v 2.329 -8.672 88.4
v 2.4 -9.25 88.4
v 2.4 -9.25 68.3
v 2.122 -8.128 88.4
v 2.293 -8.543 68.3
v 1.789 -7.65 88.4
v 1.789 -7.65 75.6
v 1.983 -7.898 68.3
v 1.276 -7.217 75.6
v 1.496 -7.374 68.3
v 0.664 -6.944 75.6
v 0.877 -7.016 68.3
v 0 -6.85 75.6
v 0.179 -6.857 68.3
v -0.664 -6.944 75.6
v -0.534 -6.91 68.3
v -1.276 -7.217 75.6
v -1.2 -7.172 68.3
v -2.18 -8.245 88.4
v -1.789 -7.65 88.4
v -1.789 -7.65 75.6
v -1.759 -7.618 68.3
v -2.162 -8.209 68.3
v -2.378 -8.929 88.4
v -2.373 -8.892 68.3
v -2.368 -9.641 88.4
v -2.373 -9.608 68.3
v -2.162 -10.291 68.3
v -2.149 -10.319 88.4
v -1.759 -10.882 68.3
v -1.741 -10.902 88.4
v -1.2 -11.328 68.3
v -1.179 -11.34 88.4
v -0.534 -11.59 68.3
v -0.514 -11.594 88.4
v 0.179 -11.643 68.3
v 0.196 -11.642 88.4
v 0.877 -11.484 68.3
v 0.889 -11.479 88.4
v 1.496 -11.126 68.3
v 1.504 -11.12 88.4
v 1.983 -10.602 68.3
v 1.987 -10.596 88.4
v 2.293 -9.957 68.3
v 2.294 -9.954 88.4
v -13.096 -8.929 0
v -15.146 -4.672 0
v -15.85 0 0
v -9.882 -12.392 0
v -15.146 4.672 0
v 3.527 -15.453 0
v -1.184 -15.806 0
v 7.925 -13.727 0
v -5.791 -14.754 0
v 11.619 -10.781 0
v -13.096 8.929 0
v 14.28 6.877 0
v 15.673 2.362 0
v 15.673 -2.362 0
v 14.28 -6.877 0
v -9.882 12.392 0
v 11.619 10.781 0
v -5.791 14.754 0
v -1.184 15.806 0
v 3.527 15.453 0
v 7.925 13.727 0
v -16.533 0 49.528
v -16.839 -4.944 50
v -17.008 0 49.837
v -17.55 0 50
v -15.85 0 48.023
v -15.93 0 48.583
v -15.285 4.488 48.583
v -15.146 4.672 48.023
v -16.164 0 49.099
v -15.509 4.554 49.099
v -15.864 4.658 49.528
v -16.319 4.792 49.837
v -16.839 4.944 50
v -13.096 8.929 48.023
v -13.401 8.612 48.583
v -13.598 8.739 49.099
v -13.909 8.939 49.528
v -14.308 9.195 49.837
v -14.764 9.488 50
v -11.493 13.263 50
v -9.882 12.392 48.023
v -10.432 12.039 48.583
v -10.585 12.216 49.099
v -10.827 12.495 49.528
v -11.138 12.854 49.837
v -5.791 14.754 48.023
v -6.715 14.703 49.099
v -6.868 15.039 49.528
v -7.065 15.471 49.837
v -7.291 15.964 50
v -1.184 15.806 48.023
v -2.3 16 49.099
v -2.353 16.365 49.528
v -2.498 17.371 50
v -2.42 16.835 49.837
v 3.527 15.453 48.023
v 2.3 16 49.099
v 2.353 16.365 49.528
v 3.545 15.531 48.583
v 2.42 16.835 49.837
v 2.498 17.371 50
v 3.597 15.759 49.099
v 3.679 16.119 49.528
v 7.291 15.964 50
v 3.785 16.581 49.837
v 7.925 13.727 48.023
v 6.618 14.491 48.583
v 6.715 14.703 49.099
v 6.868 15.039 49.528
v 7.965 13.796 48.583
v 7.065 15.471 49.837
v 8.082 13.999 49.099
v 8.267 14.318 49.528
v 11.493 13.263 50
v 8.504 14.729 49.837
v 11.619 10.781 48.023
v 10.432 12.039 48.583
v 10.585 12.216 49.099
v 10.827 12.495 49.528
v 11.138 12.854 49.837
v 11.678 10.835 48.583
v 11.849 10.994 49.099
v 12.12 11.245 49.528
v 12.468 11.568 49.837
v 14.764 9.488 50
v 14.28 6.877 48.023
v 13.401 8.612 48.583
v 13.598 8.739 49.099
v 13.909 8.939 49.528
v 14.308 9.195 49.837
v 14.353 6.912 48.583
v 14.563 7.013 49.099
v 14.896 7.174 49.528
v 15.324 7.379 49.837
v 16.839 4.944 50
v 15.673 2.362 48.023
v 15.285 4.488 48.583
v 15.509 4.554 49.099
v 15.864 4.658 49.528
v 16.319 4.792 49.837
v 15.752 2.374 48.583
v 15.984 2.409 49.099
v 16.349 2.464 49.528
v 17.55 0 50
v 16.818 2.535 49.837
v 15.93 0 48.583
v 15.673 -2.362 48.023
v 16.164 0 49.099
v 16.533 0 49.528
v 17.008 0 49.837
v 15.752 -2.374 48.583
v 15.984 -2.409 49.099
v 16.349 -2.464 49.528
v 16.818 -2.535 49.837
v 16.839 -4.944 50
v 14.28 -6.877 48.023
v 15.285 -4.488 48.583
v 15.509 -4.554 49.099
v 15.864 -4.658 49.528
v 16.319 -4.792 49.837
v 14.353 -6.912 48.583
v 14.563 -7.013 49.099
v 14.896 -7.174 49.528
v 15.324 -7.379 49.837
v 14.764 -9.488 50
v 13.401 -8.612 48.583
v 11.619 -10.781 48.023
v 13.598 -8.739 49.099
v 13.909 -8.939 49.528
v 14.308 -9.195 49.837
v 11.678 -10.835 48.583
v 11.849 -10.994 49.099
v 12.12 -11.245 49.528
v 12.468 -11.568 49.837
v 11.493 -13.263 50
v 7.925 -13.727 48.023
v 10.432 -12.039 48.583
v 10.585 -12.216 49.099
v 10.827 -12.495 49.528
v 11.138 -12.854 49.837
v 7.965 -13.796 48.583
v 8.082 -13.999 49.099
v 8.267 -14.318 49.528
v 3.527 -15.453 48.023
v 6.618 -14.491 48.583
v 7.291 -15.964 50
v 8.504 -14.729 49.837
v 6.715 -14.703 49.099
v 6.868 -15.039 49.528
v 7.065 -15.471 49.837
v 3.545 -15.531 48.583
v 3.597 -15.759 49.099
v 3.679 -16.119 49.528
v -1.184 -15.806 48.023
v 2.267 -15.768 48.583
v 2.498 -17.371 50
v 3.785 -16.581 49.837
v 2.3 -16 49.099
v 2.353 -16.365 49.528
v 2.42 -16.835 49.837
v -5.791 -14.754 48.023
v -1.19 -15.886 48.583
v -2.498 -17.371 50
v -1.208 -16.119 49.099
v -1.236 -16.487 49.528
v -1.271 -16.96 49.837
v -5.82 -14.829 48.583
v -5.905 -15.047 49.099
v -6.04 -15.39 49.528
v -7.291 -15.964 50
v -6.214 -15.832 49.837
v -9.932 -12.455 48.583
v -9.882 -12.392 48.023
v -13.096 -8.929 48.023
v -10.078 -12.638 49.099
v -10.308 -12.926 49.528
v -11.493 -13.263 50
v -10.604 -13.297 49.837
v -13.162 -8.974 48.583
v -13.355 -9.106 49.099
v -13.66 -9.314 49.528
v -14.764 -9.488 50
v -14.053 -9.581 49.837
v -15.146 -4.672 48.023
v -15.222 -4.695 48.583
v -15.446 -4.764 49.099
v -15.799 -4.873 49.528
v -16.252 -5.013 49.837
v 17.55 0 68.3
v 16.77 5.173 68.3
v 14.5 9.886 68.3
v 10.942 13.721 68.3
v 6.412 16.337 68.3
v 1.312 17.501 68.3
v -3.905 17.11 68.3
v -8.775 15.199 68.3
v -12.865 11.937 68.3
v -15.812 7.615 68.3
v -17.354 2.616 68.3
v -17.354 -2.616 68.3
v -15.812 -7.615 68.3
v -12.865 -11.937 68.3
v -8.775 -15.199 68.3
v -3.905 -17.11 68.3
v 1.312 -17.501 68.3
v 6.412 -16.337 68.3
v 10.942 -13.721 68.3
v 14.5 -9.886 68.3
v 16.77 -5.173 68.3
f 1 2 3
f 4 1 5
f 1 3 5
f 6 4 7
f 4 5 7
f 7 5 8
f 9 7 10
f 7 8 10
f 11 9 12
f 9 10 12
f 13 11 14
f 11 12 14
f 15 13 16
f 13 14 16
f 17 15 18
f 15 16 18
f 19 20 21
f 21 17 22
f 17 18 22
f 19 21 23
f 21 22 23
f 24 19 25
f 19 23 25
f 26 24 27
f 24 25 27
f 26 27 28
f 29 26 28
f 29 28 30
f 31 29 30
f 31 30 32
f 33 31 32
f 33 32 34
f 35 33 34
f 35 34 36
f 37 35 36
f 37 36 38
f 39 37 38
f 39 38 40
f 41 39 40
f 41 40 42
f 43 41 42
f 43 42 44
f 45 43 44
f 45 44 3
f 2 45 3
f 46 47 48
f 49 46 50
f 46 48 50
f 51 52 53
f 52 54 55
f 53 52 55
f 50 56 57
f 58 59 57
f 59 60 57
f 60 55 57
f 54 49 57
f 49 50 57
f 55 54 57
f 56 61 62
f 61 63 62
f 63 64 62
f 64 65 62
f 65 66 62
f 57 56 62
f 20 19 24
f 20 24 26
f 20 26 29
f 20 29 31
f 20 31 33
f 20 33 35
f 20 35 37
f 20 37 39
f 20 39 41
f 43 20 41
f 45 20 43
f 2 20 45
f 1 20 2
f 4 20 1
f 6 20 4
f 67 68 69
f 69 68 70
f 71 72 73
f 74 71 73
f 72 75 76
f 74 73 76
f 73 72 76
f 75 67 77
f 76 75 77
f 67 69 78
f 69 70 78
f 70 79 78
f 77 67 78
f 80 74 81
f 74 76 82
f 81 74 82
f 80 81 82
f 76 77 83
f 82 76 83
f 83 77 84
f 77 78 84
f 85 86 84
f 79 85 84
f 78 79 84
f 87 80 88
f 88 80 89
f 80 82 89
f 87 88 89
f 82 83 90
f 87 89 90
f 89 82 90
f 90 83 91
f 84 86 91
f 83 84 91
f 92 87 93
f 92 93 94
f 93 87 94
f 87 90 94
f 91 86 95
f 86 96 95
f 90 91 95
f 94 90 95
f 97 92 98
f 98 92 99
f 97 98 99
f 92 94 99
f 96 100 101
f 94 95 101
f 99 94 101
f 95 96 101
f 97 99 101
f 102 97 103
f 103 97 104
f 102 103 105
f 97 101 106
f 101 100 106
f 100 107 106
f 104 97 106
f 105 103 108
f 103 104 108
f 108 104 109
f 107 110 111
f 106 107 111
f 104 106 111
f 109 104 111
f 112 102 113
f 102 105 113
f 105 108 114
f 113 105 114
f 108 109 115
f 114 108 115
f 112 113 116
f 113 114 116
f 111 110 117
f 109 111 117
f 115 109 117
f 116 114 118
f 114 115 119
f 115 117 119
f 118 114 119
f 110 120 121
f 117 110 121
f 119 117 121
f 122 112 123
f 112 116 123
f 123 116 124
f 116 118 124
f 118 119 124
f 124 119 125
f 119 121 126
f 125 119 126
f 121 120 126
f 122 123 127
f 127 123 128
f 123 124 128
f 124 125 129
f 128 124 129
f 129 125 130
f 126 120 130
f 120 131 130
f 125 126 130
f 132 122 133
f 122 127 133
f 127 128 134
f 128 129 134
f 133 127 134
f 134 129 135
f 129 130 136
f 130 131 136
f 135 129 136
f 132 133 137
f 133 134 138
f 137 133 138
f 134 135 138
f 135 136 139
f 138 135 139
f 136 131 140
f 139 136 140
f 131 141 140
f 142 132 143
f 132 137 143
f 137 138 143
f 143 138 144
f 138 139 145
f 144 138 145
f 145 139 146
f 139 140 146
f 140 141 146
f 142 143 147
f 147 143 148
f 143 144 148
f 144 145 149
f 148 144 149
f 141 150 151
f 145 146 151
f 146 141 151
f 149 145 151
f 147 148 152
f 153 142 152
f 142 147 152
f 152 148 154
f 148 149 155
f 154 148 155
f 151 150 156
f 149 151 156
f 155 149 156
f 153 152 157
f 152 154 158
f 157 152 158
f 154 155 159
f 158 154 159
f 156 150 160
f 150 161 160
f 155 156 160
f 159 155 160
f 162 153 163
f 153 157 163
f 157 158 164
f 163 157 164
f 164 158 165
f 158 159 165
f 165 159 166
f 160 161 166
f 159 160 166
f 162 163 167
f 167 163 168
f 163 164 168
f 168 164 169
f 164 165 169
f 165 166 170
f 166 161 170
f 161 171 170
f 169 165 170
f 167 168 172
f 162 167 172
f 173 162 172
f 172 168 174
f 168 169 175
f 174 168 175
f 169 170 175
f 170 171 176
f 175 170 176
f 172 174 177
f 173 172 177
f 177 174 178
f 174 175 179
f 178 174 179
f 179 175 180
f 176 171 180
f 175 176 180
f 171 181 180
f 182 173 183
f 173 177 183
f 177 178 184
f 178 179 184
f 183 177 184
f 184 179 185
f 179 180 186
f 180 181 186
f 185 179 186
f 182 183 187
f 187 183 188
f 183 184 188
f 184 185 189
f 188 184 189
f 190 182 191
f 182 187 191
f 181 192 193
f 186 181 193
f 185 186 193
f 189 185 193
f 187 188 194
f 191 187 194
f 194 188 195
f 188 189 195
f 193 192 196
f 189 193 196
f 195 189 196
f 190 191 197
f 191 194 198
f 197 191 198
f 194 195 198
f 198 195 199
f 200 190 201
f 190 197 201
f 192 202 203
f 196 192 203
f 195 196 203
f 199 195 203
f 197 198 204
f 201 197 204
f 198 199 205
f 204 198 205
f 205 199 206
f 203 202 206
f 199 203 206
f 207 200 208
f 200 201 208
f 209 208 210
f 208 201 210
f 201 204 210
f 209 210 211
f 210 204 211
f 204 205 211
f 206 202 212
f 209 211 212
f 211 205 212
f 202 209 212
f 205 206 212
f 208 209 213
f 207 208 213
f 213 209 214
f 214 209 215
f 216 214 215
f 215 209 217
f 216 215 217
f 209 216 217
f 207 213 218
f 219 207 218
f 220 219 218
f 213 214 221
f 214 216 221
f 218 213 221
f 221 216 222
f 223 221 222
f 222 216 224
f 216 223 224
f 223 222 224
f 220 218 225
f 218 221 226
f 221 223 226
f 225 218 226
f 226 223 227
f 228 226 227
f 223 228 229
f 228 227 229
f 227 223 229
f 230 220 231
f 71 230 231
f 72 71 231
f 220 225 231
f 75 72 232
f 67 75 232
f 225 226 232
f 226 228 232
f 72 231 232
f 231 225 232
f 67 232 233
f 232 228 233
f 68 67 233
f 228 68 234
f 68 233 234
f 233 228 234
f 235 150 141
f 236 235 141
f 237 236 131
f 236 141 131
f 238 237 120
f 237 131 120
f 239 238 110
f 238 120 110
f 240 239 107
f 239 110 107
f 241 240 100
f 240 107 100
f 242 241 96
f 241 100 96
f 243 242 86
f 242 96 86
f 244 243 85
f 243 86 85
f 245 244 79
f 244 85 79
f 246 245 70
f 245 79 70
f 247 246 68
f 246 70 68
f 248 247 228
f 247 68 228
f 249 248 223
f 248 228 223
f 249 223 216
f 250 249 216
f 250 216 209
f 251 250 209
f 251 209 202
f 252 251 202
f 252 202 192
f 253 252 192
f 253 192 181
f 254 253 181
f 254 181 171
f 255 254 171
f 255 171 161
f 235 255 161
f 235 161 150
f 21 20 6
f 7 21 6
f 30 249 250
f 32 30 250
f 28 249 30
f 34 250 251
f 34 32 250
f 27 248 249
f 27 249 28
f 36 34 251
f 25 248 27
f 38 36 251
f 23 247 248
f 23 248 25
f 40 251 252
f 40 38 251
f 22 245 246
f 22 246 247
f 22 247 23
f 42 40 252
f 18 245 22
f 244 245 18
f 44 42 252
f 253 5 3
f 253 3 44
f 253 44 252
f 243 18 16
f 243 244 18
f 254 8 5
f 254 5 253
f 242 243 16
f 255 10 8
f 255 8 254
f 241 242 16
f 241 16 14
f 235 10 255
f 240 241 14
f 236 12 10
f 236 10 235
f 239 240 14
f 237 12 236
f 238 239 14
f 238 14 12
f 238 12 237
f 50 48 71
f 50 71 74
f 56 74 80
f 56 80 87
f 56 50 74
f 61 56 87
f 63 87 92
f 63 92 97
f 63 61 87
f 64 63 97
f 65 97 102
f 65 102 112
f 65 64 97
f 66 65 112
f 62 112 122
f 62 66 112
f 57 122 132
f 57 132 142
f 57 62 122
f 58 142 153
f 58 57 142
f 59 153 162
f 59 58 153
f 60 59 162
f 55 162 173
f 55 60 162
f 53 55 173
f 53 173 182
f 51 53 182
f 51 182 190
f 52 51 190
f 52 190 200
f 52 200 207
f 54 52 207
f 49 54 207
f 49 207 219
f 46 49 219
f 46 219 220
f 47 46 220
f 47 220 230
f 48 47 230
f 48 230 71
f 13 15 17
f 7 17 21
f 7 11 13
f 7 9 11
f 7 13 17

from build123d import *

# Parameters (mm, degrees)
SKETCH2_R           = 17.55
BOSS_EXTRUDE1_DEPTH = 68.3
SKETCH4_R           = 17.55
SKETCH4_R_2         = 15.85
CUT_EXTRUDE1_DEPTH  = 50
SKETCH5_R           = 2.4
BOSS_EXTRUDE3_DEPTH = 20.1
SKETCH6_W           = 4.602135996
SKETCH6_H           = 1.29181111
CUT_EXTRUDE2_DEPTH  = 12.8
FILLET1_R           = 2


with BuildPart() as part:
    # Sketch2 → Boss-Extrude1 (new body)
    with BuildSketch(Plane.XY):
        Circle(SKETCH2_R)
    extrude(amount=BOSS_EXTRUDE1_DEPTH)

    # Sketch4 → Cut-Extrude1 (cut)
    with BuildSketch(Plane(origin=(0, 0, 0), x_dir=(-1, 0, 0), z_dir=(0, 0, -1))):
        Circle(SKETCH4_R)
        Circle(SKETCH4_R_2, mode=Mode.SUBTRACT)
    extrude(amount=-CUT_EXTRUDE1_DEPTH, mode=Mode.SUBTRACT)

    # Sketch5 → Boss-Extrude3 (add)
    with BuildSketch(Plane.XY.offset(68.3)):
        with Locations((0, -9.25)):
            Circle(SKETCH5_R)
    extrude(amount=BOSS_EXTRUDE3_DEPTH)

    # Sketch6 → Cut-Extrude2 (cut)
    with BuildSketch(Plane.XY.offset(88.4)):
        with Locations((0.017586897, -7.004094445)):
            Rectangle(SKETCH6_W, SKETCH6_H)
    extrude(amount=-CUT_EXTRUDE2_DEPTH, mode=Mode.SUBTRACT)

    # Fillet1
    # the kernel refuses this fillet: 2 mm, written as the material it adds along each edge
    with BuildSketch(Plane(origin=(0, 0, 50), x_dir=(-1, 0, 0), z_dir=(0, -1, 0))) as fillet1_piece_1:
        with BuildLine():
            CenterArc((17.85, 1.977371993), FILLET1_R, 180, 81.373073441)
            Line((15.85, 1.977371993), (15.81, 1.977371993))
            Line((15.81, 1.977371993), (15.81, 0))
            Line((15.81, 0), (15.85, -0.04))
            ThreePointArc((15.85, -0.04), (16.7, -0.04), (17.544, -0.03954744))
            Line((17.544, -0.03954744), (17.55, 0))
        make_face()
    revolve(axis=Axis((0, 0, 50), (0, 0, -1)))


solid = part.part
